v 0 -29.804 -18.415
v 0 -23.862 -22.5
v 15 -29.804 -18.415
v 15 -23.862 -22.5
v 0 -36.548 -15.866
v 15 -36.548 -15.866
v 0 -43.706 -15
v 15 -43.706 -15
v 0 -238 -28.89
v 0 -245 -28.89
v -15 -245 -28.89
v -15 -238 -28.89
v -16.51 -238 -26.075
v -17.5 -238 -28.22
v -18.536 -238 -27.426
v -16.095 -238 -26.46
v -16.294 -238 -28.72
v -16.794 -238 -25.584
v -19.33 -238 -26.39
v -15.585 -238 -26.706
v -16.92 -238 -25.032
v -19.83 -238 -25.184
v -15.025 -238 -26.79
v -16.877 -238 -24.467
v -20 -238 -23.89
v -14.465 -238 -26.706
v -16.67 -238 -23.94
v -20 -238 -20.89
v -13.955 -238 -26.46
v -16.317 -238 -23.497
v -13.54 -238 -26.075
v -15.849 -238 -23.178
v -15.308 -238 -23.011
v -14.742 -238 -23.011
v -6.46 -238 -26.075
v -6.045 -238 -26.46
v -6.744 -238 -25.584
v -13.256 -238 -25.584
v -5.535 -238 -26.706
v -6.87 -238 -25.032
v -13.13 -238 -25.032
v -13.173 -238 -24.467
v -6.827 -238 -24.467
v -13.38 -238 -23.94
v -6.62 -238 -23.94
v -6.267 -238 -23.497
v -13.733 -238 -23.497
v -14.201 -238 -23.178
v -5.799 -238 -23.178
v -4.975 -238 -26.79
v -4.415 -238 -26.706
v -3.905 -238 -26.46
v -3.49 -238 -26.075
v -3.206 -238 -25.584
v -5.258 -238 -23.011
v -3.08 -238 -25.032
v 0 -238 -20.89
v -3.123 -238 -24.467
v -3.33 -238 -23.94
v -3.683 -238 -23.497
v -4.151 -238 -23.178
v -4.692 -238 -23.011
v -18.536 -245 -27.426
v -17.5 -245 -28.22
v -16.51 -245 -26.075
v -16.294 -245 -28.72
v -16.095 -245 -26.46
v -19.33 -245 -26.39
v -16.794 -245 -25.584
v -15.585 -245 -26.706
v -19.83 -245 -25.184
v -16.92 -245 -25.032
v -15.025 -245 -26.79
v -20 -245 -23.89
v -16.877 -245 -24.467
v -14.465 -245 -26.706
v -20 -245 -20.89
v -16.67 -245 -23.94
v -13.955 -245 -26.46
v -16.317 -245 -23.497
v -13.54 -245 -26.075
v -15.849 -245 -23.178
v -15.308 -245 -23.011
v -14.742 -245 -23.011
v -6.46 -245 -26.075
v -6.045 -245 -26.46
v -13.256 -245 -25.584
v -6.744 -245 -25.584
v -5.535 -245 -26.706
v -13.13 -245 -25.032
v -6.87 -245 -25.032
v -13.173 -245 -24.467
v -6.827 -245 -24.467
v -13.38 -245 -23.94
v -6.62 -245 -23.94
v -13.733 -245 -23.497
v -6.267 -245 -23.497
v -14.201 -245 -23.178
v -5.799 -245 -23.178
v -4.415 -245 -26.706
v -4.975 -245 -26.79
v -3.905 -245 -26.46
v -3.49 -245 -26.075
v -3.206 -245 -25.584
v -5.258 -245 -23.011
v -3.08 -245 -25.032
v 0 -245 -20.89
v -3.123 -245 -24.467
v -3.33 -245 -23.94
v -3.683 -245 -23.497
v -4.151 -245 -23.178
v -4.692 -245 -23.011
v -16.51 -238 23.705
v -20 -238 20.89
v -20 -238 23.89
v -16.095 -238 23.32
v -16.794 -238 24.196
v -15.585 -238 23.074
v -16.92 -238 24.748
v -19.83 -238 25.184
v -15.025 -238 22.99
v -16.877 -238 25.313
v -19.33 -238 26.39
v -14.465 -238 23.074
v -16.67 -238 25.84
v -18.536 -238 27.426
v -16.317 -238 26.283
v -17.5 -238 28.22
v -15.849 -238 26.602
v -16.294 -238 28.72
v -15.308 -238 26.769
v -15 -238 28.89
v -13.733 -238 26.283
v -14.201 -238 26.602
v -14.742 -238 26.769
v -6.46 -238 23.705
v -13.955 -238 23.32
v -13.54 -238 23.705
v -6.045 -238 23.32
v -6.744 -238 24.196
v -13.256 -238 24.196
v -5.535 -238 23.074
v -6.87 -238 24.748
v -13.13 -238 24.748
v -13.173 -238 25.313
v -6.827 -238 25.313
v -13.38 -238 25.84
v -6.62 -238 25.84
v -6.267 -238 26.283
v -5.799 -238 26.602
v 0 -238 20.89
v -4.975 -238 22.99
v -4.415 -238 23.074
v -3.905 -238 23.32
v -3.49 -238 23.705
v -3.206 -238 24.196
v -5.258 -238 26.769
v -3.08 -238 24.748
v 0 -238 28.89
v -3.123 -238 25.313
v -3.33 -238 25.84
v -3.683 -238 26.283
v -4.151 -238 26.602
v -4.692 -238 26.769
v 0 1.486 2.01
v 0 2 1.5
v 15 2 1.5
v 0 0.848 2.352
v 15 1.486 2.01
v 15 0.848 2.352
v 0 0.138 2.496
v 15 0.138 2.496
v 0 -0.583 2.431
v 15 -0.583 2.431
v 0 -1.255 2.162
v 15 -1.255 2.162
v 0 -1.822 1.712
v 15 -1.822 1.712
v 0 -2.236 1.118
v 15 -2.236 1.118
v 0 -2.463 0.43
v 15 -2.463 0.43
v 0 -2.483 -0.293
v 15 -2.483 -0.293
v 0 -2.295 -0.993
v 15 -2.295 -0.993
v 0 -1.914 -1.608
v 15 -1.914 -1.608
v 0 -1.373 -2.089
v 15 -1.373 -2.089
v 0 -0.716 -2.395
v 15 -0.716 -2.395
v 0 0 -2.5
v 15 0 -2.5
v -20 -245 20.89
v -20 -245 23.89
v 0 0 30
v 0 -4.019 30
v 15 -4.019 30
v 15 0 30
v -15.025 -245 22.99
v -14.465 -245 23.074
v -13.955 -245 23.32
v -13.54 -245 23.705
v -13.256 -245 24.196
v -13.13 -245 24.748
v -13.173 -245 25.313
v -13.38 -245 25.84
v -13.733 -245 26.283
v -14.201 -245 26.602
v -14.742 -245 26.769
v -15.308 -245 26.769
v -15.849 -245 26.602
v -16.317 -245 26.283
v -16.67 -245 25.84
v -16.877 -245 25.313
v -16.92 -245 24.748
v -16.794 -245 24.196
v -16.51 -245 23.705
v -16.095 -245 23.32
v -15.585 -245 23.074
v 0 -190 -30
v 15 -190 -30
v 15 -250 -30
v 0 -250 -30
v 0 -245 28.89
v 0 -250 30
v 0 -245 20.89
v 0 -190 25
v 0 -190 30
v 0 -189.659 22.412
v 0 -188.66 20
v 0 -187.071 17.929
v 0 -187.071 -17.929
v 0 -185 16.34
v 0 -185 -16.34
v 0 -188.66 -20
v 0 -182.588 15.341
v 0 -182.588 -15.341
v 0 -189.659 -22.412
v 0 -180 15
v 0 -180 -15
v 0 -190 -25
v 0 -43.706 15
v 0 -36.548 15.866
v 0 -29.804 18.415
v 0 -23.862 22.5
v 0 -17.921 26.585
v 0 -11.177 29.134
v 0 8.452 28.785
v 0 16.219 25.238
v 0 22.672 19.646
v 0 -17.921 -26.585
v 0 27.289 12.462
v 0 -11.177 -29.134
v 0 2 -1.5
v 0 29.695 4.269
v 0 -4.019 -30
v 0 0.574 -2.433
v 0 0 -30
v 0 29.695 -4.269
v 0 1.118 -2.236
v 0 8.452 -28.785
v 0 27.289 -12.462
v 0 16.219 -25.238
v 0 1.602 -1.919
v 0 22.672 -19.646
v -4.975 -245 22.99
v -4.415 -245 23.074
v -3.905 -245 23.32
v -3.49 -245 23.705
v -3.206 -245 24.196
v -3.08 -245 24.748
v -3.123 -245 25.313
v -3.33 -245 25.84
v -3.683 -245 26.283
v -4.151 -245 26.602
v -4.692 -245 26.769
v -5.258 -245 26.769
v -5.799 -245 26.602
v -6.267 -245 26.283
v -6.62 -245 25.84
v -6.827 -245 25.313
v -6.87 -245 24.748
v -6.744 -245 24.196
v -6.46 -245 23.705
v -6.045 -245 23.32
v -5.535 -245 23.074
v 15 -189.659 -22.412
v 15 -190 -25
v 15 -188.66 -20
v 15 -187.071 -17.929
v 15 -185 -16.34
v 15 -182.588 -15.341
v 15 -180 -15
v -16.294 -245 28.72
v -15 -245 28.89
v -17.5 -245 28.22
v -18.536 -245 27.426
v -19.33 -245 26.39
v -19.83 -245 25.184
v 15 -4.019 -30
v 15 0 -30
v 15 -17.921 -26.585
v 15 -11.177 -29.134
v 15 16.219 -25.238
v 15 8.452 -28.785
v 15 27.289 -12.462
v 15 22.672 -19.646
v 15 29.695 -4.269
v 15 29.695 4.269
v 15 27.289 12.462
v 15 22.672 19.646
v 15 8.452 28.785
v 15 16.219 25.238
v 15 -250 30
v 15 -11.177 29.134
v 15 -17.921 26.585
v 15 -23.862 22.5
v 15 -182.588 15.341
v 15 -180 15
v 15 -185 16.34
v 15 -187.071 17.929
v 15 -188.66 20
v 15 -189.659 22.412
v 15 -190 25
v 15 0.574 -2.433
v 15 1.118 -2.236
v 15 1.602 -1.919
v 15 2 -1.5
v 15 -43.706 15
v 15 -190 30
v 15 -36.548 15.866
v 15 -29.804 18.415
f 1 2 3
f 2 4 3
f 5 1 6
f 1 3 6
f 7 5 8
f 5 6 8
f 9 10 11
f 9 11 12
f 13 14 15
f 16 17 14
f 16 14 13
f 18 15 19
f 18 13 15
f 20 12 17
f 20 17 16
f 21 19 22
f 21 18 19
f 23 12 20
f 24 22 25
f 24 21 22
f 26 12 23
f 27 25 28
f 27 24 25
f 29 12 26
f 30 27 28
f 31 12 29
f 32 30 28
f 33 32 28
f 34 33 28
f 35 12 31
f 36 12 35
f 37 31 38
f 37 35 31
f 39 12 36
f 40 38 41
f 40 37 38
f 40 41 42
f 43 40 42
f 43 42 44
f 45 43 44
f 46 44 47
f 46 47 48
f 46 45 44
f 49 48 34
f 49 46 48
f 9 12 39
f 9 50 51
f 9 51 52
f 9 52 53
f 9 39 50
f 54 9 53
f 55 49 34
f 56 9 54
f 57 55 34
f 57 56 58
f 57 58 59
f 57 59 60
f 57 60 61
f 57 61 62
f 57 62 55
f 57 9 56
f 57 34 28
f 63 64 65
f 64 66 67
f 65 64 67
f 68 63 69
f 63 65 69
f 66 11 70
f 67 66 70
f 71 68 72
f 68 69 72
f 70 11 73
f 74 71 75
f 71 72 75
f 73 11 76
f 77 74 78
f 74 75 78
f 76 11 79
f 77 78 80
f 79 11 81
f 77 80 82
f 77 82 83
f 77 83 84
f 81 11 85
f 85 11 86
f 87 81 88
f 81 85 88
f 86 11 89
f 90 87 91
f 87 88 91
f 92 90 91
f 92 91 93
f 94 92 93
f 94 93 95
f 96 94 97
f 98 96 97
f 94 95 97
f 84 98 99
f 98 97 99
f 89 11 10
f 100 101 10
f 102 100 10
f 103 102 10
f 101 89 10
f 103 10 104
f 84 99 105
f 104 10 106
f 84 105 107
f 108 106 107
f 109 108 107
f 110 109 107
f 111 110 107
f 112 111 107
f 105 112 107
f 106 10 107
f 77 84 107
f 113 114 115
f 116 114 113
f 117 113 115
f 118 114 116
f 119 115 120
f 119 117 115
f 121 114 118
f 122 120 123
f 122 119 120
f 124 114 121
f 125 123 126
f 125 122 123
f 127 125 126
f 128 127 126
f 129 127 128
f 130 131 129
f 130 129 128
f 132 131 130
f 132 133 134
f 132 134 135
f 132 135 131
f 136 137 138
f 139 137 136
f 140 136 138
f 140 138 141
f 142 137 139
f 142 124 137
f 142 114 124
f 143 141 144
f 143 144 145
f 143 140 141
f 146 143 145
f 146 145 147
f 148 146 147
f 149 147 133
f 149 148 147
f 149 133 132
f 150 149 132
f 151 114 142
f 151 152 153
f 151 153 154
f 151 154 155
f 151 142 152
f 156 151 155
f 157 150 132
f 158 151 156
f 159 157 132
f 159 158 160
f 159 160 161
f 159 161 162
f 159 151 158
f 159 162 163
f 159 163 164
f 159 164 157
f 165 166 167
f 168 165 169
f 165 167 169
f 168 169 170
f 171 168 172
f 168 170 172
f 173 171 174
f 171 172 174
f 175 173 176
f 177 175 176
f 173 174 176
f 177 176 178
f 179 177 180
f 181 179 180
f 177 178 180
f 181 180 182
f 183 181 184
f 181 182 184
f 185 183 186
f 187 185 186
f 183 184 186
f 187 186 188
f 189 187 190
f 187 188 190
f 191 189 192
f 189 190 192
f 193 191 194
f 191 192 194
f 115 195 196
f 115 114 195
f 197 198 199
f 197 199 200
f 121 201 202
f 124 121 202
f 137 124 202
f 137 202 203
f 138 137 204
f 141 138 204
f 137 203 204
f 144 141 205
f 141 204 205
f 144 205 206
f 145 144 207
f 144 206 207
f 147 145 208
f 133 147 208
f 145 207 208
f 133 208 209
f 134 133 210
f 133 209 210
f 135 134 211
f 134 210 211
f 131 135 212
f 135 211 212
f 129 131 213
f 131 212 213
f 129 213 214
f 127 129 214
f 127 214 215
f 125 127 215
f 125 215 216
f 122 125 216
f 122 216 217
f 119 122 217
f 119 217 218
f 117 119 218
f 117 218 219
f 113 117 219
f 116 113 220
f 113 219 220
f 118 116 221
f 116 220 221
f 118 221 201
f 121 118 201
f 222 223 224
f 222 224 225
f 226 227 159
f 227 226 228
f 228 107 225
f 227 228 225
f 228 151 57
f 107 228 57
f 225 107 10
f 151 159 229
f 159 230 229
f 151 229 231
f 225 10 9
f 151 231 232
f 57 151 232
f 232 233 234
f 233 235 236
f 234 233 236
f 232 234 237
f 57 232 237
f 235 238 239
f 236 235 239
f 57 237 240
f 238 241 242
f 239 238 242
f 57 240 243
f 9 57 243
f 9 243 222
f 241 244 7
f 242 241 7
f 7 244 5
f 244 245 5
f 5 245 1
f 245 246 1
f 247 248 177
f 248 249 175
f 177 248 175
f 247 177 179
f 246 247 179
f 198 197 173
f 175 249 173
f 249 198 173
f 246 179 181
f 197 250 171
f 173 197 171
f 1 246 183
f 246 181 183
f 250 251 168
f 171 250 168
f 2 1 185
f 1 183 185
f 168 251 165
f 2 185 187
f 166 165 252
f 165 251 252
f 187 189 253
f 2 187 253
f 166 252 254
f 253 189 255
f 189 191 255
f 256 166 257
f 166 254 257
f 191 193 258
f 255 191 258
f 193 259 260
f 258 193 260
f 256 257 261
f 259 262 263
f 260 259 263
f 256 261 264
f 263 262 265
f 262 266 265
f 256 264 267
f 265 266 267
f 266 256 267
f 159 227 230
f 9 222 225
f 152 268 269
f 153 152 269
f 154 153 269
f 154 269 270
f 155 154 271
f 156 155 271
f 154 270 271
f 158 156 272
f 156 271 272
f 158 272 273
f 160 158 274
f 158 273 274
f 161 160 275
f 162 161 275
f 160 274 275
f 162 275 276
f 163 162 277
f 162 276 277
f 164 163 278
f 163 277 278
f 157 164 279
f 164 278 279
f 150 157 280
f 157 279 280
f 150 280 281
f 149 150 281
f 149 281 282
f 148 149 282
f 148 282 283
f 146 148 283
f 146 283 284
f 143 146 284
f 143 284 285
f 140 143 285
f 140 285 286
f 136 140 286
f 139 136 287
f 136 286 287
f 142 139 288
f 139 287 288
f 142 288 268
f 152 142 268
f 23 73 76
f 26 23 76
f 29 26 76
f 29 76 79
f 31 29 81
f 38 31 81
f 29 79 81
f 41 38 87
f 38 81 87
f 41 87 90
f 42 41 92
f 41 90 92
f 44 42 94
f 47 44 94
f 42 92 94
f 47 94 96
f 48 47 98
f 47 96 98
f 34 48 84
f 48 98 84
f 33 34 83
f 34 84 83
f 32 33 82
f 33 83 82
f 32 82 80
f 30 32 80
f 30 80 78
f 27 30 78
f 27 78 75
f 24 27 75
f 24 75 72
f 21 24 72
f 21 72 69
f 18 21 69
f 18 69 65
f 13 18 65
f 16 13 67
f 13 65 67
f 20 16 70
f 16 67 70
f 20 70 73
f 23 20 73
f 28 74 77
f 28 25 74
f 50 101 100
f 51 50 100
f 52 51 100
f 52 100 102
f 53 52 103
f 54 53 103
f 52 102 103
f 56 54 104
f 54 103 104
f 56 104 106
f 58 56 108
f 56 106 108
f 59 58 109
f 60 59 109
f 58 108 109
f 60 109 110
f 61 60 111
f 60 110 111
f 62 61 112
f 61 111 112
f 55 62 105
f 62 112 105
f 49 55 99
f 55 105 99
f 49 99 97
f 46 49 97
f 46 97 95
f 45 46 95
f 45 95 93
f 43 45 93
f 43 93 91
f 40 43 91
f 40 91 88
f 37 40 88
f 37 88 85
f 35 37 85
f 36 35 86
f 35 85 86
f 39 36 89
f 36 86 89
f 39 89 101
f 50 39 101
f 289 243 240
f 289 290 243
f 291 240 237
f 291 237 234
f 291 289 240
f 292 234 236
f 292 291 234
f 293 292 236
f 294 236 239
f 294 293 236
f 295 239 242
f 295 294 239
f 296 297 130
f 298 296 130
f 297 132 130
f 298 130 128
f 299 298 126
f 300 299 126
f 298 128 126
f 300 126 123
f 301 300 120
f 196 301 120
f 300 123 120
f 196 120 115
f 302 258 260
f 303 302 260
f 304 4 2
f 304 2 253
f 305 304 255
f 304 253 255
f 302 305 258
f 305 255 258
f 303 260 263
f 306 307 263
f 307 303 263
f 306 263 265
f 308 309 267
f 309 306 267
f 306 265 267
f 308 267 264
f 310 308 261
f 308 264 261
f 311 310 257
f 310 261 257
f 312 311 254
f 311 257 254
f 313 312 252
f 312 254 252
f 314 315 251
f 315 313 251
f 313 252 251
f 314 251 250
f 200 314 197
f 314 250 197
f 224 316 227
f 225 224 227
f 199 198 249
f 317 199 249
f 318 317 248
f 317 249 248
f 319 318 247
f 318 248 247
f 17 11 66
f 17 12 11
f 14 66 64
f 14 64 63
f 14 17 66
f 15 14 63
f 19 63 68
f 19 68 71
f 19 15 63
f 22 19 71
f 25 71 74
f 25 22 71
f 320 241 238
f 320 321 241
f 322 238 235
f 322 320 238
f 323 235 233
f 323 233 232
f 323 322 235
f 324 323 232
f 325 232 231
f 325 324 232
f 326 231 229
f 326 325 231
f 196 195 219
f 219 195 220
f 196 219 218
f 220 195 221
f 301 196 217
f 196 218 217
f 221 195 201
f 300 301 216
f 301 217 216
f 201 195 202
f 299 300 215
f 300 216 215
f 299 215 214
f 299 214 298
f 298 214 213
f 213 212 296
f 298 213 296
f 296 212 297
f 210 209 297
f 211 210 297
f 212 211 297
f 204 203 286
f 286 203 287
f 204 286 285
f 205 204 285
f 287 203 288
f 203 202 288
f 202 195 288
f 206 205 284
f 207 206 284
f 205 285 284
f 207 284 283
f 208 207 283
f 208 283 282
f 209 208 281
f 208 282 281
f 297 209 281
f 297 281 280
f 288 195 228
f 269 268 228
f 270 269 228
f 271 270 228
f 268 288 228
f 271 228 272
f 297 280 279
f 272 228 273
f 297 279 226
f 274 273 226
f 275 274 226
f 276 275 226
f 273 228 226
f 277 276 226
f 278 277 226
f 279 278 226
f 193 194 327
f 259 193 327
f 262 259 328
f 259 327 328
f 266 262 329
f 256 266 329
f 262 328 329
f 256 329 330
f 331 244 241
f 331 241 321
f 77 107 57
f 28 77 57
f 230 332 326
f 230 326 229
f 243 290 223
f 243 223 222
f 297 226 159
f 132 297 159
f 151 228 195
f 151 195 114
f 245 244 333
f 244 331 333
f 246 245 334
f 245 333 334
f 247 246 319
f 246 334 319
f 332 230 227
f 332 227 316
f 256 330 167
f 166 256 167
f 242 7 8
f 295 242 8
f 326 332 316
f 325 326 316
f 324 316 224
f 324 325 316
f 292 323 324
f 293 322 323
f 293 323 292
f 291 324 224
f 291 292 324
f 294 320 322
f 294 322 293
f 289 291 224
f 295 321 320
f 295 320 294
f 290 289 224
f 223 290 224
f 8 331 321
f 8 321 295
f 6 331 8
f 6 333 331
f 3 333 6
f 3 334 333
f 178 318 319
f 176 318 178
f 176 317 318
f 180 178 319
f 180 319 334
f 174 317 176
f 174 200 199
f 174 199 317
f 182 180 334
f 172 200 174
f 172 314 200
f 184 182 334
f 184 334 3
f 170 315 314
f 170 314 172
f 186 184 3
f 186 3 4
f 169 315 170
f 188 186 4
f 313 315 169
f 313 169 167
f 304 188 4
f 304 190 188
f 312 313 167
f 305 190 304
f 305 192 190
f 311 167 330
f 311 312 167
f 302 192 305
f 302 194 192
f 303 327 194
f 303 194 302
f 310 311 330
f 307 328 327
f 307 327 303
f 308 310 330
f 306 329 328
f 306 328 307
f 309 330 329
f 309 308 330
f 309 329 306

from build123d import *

# Parameters (mm, degrees)
SKETCH1_W           = 60
SKETCH1_H           = 60
BOSS_EXTRUDE1_DEPTH = 15
CUT_EXTRUDE1_DEPTH  = 15
SKETCH8_W           = 15
SKETCH8_H           = 30
BOSS_EXTRUDE2_DEPTH = 160
BOSS_EXTRUDE3_DEPTH = 60
SKETCH10_W          = 8
SKETCH10_H          = 7
BOSS_EXTRUDE4_DEPTH = 20
SKETCH12_R          = 1.9
CUT_EXTRUDE2_DEPTH  = 7
FILLET1_R           = 30
FILLET2_R           = 30
FILLET4_R           = 10
FILLET5_R           = 5


with BuildPart() as part:
    # Sketch1 → Boss-Extrude1 (new body)
    with BuildSketch(Plane(origin=(0, 0, 0), x_dir=(0, 0, -1), z_dir=(1, 0, 0))):
        Rectangle(SKETCH1_W, SKETCH1_H)
    extrude(amount=BOSS_EXTRUDE1_DEPTH)

    # Sketch2 → Cut-Extrude1 (cut)
    with BuildSketch(Plane(origin=(15, 0, 0), x_dir=(0, 0, -1), z_dir=(1, 0, 0))):
        with BuildLine():
            ThreePointArc((2.5, 0), (2.236067977, 1.118033989), (1.5, 2))
            Line((1.5, 2), (-1.5, 2))
            ThreePointArc((-1.5, 2), (-1.118033989, -2.236067977), (2.5, 0))
        make_face()
    extrude(amount=-CUT_EXTRUDE1_DEPTH, mode=Mode.SUBTRACT)

    # Sketch8 → Boss-Extrude2 (add)
    with BuildSketch(Plane.XZ.offset(30)):
        with Locations((7.5, 0)):
            Rectangle(SKETCH8_W, SKETCH8_H)
    extrude(amount=BOSS_EXTRUDE2_DEPTH)

    # Sketch9 → Boss-Extrude3 (add)
    with BuildSketch(Plane.XZ.offset(190)):
        Polygon((0, 0), (0, 30), (15, 30), (15, -30), (0, -30), align=None)
    extrude(amount=BOSS_EXTRUDE3_DEPTH)

    # Sketch10 → Boss-Extrude4 (add)
    with BuildSketch(Plane.ZY):
        with Locations((24.89, -241.5)):
            Rectangle(SKETCH10_W, SKETCH10_H)
        with Locations((-24.89, -241.5)):
            Rectangle(SKETCH10_W, SKETCH10_H)
    extrude(amount=BOSS_EXTRUDE4_DEPTH)

    # Sketch12 → Cut-Extrude2 (cut)
    with BuildSketch(Plane.XZ.offset(245)):
        with Locations(Location((-15.025, 24.89, 0), (0, 0, 270))):
            Circle(SKETCH12_R)
        with Locations(Location((-4.975, 24.89, 0), (0, 0, 270))):
            Circle(SKETCH12_R)
        with Locations(Location((-4.975, -24.89, 0), (0, 0, 270))):
            Circle(SKETCH12_R)
        with Locations(Location((-15.025, -24.89, 0), (0, 0, 270))):
            Circle(SKETCH12_R)
    extrude(amount=-CUT_EXTRUDE2_DEPTH, mode=Mode.SUBTRACT)

    # Fillet1
    # the kernel refuses this fillet: 30 mm, written as the material it takes off along each edge
    with BuildSketch(Plane(origin=(-64.951905284, -30, -30), x_dir=(0, 0, 1), z_dir=(1, 0, 0))) as fillet1_piece_1:
        with BuildLine():
            CenterArc((30, -25.980762114), FILLET1_R, 120, 60)
            Line((0, -25.980762114), (-0.6, -25.980762114))
            Line((-0.6, -25.980762114), (-0.6, 0))
            Line((-0.6, 0), (0, 0.6))
            ThreePointArc((0, 0.6), (7.5, 0.6), (14.7, 0.519615242))
            Line((14.7, 0.519615242), (15, 0))
        make_face()
    extrude(amount=144.903810568, mode=Mode.SUBTRACT)
    with BuildSketch(Plane(origin=(-75, 30, -30), x_dir=(0, 0, 1), z_dir=(1, 0, 0)), Plane(origin=(-75, 30, 30), x_dir=(0, -1, 0), z_dir=(1, 0, 0))) as fillet1_piece_2:
        with BuildLine():
            CenterArc((FILLET1_R, FILLET1_R), FILLET1_R, 180, 90)
            Line((0, FILLET1_R), (-FILLET1_R * 0.02, FILLET1_R))
            Line((-FILLET1_R * 0.02, FILLET1_R), (-FILLET1_R * 0.02, -FILLET1_R * 0.02))
            Line((-FILLET1_R * 0.02, -FILLET1_R * 0.02), (FILLET1_R, -FILLET1_R * 0.02))
            Line((FILLET1_R, -FILLET1_R * 0.02), (FILLET1_R, 0))
        make_face()
    extrude(amount=165, mode=Mode.SUBTRACT)
    with BuildSketch(Plane(origin=(-64.951905284, -30, 30), x_dir=(0, 0, -1), z_dir=(1, 0, 0))) as fillet1_piece_3:
        with BuildLine():
            CenterArc((30, 25.980762114), FILLET1_R, 180, 60)
            Line((0, 25.980762114), (-0.6, 25.980762114))
            Line((-0.6, 25.980762114), (-0.6, 0))
            Line((-0.6, 0), (0, -0.6))
            ThreePointArc((0, -0.6), (7.5, -0.6), (14.7, -0.519615242))
            Line((14.7, -0.519615242), (15, 0))
        make_face()
    extrude(amount=144.903810568, mode=Mode.SUBTRACT)

    # Fillet2
    fillet2_edges = [part.edges().sort_by_distance(p)[0] for p in [
        (7.5, -30, -15),
        (7.5, -30, 15),
    ]]
    fillet(fillet2_edges, radius=FILLET2_R)

    # Fillet4
    fillet4_edges = [part.edges().sort_by_distance(p)[0] for p in [
        (7.5, -190, -15),
        (7.5, -190, 15),
    ]]
    fillet(fillet4_edges, radius=FILLET4_R)

    # Fillet5
    fillet5_edges = [part.edges().sort_by_distance(p)[0] for p in [
        (-20, -241.5, 28.89),
        (-20, -241.5, -28.89),
    ]]
    fillet(fillet5_edges, radius=FILLET5_R)


solid = part.part
